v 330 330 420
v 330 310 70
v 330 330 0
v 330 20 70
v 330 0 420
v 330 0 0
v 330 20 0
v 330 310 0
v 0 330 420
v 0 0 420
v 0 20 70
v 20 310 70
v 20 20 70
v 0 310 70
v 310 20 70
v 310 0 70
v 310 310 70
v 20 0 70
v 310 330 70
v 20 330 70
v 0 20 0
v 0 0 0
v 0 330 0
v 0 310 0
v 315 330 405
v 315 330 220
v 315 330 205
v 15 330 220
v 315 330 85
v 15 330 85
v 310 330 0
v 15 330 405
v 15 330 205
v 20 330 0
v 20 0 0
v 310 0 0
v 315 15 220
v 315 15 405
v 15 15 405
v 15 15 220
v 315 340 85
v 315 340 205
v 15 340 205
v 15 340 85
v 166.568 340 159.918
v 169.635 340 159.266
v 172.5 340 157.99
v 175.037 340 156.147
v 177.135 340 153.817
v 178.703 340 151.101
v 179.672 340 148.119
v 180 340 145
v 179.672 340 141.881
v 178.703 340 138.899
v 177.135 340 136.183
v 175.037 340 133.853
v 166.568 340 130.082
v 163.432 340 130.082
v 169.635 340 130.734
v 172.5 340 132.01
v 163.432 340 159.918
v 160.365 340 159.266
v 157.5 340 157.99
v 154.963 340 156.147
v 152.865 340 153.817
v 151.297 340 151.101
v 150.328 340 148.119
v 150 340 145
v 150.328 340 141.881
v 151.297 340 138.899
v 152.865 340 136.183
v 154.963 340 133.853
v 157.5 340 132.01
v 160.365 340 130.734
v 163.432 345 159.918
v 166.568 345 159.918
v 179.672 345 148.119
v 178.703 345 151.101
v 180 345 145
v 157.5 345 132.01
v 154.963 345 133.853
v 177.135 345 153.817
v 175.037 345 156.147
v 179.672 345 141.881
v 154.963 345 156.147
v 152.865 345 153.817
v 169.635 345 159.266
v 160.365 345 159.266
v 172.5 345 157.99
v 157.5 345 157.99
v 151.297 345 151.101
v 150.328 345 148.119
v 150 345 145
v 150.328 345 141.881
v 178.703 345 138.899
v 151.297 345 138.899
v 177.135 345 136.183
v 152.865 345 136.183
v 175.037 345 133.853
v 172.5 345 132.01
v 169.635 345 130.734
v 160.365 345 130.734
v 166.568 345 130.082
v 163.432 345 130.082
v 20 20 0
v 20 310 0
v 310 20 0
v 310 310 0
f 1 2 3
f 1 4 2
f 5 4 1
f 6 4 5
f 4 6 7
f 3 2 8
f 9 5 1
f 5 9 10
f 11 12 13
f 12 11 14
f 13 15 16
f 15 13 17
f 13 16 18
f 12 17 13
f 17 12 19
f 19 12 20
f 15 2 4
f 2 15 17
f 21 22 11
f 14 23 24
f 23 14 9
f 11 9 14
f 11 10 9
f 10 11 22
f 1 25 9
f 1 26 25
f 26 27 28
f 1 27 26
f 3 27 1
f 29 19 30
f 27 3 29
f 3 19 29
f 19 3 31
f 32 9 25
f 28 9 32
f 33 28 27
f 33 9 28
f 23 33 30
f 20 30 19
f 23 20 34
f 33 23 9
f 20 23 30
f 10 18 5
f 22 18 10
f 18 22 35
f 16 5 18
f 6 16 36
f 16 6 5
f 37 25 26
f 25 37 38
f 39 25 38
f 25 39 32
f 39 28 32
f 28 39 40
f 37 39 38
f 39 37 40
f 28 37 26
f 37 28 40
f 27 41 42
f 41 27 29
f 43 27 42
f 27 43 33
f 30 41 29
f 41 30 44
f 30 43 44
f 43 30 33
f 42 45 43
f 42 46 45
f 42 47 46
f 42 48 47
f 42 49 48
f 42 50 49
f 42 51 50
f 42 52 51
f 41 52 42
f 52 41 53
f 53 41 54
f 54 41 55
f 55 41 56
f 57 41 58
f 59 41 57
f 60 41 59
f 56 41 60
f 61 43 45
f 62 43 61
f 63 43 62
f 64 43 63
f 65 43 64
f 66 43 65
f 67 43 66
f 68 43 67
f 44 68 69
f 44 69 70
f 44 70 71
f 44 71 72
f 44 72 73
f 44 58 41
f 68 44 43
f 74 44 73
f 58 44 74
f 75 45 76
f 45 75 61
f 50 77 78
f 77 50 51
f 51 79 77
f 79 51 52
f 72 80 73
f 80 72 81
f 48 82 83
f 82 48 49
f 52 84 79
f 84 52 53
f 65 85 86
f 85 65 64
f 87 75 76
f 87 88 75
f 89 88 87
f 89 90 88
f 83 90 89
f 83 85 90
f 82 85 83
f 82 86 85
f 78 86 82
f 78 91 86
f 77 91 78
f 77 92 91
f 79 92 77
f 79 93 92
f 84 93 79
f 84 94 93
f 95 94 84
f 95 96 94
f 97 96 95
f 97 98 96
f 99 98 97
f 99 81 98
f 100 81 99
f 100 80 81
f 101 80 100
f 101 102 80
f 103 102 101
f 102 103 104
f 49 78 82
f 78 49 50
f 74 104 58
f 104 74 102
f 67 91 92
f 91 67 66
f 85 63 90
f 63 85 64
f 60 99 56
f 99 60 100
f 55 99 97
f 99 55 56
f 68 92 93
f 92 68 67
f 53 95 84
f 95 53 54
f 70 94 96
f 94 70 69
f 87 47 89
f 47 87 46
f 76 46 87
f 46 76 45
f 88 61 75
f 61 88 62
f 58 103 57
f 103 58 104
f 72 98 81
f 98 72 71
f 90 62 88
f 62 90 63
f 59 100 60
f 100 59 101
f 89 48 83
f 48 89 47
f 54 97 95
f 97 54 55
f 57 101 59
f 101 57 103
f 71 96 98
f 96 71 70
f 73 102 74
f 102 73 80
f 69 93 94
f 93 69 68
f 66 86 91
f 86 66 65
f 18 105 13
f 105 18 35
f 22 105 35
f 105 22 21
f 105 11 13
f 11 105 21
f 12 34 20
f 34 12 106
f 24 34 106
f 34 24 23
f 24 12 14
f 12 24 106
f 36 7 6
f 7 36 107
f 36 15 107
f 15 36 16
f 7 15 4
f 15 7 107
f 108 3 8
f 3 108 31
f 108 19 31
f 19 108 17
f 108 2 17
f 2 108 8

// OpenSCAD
w=330; //mm
d=330;
t=150; //thickness

h=420; //height
h_frame=350;

leg_t = 20; //leg thickness
mat_t = 15; //material thickness


module leg(x,y) {
    translate([x,y,0]){
        cube(size = [leg_t,leg_t,h-h_frame], center = false); //thin legs
        //cube(size = [leg_t,d,h-t], center = false); //side wals
    }
}

//Frame
translate([0,0,h-h_frame]){ 
    difference() {
    cube(size = [w,d,h_frame], center = false);
    translate([mat_t,mat_t,mat_t]){
    cube(size = [w-(2*mat_t),2*d,h_frame-(2*mat_t)], center = false);}
    }
}

//Top shelf with drawer
translate([0,0,h-h_frame]){
    cube(size = [w,d,t], center = false);
    translate([15,d-20,15]){ color("SaddleBrown", 0.8){
        cube(size = [w-30,30,t-30], center = false); //Drawer front
        }}
}

//Drawer fob
fob_w=15;
translate([w/2,d+15, h-h_frame+t/2]) { rotate([90,0,0]){ color("DarkGoldenrod", 1.0) {
    cylinder(h=20, r1 = fob_w, r2 = fob_w, center = false);
}}}

/*
//Under shelf
translate([0,0,100]){
    cube(size = [w,d,15], center = false);
}
*/



leg(0, 0);
leg(0, d-leg_t);
leg(w-leg_t, 0);
leg(w-leg_t, d-leg_t);
